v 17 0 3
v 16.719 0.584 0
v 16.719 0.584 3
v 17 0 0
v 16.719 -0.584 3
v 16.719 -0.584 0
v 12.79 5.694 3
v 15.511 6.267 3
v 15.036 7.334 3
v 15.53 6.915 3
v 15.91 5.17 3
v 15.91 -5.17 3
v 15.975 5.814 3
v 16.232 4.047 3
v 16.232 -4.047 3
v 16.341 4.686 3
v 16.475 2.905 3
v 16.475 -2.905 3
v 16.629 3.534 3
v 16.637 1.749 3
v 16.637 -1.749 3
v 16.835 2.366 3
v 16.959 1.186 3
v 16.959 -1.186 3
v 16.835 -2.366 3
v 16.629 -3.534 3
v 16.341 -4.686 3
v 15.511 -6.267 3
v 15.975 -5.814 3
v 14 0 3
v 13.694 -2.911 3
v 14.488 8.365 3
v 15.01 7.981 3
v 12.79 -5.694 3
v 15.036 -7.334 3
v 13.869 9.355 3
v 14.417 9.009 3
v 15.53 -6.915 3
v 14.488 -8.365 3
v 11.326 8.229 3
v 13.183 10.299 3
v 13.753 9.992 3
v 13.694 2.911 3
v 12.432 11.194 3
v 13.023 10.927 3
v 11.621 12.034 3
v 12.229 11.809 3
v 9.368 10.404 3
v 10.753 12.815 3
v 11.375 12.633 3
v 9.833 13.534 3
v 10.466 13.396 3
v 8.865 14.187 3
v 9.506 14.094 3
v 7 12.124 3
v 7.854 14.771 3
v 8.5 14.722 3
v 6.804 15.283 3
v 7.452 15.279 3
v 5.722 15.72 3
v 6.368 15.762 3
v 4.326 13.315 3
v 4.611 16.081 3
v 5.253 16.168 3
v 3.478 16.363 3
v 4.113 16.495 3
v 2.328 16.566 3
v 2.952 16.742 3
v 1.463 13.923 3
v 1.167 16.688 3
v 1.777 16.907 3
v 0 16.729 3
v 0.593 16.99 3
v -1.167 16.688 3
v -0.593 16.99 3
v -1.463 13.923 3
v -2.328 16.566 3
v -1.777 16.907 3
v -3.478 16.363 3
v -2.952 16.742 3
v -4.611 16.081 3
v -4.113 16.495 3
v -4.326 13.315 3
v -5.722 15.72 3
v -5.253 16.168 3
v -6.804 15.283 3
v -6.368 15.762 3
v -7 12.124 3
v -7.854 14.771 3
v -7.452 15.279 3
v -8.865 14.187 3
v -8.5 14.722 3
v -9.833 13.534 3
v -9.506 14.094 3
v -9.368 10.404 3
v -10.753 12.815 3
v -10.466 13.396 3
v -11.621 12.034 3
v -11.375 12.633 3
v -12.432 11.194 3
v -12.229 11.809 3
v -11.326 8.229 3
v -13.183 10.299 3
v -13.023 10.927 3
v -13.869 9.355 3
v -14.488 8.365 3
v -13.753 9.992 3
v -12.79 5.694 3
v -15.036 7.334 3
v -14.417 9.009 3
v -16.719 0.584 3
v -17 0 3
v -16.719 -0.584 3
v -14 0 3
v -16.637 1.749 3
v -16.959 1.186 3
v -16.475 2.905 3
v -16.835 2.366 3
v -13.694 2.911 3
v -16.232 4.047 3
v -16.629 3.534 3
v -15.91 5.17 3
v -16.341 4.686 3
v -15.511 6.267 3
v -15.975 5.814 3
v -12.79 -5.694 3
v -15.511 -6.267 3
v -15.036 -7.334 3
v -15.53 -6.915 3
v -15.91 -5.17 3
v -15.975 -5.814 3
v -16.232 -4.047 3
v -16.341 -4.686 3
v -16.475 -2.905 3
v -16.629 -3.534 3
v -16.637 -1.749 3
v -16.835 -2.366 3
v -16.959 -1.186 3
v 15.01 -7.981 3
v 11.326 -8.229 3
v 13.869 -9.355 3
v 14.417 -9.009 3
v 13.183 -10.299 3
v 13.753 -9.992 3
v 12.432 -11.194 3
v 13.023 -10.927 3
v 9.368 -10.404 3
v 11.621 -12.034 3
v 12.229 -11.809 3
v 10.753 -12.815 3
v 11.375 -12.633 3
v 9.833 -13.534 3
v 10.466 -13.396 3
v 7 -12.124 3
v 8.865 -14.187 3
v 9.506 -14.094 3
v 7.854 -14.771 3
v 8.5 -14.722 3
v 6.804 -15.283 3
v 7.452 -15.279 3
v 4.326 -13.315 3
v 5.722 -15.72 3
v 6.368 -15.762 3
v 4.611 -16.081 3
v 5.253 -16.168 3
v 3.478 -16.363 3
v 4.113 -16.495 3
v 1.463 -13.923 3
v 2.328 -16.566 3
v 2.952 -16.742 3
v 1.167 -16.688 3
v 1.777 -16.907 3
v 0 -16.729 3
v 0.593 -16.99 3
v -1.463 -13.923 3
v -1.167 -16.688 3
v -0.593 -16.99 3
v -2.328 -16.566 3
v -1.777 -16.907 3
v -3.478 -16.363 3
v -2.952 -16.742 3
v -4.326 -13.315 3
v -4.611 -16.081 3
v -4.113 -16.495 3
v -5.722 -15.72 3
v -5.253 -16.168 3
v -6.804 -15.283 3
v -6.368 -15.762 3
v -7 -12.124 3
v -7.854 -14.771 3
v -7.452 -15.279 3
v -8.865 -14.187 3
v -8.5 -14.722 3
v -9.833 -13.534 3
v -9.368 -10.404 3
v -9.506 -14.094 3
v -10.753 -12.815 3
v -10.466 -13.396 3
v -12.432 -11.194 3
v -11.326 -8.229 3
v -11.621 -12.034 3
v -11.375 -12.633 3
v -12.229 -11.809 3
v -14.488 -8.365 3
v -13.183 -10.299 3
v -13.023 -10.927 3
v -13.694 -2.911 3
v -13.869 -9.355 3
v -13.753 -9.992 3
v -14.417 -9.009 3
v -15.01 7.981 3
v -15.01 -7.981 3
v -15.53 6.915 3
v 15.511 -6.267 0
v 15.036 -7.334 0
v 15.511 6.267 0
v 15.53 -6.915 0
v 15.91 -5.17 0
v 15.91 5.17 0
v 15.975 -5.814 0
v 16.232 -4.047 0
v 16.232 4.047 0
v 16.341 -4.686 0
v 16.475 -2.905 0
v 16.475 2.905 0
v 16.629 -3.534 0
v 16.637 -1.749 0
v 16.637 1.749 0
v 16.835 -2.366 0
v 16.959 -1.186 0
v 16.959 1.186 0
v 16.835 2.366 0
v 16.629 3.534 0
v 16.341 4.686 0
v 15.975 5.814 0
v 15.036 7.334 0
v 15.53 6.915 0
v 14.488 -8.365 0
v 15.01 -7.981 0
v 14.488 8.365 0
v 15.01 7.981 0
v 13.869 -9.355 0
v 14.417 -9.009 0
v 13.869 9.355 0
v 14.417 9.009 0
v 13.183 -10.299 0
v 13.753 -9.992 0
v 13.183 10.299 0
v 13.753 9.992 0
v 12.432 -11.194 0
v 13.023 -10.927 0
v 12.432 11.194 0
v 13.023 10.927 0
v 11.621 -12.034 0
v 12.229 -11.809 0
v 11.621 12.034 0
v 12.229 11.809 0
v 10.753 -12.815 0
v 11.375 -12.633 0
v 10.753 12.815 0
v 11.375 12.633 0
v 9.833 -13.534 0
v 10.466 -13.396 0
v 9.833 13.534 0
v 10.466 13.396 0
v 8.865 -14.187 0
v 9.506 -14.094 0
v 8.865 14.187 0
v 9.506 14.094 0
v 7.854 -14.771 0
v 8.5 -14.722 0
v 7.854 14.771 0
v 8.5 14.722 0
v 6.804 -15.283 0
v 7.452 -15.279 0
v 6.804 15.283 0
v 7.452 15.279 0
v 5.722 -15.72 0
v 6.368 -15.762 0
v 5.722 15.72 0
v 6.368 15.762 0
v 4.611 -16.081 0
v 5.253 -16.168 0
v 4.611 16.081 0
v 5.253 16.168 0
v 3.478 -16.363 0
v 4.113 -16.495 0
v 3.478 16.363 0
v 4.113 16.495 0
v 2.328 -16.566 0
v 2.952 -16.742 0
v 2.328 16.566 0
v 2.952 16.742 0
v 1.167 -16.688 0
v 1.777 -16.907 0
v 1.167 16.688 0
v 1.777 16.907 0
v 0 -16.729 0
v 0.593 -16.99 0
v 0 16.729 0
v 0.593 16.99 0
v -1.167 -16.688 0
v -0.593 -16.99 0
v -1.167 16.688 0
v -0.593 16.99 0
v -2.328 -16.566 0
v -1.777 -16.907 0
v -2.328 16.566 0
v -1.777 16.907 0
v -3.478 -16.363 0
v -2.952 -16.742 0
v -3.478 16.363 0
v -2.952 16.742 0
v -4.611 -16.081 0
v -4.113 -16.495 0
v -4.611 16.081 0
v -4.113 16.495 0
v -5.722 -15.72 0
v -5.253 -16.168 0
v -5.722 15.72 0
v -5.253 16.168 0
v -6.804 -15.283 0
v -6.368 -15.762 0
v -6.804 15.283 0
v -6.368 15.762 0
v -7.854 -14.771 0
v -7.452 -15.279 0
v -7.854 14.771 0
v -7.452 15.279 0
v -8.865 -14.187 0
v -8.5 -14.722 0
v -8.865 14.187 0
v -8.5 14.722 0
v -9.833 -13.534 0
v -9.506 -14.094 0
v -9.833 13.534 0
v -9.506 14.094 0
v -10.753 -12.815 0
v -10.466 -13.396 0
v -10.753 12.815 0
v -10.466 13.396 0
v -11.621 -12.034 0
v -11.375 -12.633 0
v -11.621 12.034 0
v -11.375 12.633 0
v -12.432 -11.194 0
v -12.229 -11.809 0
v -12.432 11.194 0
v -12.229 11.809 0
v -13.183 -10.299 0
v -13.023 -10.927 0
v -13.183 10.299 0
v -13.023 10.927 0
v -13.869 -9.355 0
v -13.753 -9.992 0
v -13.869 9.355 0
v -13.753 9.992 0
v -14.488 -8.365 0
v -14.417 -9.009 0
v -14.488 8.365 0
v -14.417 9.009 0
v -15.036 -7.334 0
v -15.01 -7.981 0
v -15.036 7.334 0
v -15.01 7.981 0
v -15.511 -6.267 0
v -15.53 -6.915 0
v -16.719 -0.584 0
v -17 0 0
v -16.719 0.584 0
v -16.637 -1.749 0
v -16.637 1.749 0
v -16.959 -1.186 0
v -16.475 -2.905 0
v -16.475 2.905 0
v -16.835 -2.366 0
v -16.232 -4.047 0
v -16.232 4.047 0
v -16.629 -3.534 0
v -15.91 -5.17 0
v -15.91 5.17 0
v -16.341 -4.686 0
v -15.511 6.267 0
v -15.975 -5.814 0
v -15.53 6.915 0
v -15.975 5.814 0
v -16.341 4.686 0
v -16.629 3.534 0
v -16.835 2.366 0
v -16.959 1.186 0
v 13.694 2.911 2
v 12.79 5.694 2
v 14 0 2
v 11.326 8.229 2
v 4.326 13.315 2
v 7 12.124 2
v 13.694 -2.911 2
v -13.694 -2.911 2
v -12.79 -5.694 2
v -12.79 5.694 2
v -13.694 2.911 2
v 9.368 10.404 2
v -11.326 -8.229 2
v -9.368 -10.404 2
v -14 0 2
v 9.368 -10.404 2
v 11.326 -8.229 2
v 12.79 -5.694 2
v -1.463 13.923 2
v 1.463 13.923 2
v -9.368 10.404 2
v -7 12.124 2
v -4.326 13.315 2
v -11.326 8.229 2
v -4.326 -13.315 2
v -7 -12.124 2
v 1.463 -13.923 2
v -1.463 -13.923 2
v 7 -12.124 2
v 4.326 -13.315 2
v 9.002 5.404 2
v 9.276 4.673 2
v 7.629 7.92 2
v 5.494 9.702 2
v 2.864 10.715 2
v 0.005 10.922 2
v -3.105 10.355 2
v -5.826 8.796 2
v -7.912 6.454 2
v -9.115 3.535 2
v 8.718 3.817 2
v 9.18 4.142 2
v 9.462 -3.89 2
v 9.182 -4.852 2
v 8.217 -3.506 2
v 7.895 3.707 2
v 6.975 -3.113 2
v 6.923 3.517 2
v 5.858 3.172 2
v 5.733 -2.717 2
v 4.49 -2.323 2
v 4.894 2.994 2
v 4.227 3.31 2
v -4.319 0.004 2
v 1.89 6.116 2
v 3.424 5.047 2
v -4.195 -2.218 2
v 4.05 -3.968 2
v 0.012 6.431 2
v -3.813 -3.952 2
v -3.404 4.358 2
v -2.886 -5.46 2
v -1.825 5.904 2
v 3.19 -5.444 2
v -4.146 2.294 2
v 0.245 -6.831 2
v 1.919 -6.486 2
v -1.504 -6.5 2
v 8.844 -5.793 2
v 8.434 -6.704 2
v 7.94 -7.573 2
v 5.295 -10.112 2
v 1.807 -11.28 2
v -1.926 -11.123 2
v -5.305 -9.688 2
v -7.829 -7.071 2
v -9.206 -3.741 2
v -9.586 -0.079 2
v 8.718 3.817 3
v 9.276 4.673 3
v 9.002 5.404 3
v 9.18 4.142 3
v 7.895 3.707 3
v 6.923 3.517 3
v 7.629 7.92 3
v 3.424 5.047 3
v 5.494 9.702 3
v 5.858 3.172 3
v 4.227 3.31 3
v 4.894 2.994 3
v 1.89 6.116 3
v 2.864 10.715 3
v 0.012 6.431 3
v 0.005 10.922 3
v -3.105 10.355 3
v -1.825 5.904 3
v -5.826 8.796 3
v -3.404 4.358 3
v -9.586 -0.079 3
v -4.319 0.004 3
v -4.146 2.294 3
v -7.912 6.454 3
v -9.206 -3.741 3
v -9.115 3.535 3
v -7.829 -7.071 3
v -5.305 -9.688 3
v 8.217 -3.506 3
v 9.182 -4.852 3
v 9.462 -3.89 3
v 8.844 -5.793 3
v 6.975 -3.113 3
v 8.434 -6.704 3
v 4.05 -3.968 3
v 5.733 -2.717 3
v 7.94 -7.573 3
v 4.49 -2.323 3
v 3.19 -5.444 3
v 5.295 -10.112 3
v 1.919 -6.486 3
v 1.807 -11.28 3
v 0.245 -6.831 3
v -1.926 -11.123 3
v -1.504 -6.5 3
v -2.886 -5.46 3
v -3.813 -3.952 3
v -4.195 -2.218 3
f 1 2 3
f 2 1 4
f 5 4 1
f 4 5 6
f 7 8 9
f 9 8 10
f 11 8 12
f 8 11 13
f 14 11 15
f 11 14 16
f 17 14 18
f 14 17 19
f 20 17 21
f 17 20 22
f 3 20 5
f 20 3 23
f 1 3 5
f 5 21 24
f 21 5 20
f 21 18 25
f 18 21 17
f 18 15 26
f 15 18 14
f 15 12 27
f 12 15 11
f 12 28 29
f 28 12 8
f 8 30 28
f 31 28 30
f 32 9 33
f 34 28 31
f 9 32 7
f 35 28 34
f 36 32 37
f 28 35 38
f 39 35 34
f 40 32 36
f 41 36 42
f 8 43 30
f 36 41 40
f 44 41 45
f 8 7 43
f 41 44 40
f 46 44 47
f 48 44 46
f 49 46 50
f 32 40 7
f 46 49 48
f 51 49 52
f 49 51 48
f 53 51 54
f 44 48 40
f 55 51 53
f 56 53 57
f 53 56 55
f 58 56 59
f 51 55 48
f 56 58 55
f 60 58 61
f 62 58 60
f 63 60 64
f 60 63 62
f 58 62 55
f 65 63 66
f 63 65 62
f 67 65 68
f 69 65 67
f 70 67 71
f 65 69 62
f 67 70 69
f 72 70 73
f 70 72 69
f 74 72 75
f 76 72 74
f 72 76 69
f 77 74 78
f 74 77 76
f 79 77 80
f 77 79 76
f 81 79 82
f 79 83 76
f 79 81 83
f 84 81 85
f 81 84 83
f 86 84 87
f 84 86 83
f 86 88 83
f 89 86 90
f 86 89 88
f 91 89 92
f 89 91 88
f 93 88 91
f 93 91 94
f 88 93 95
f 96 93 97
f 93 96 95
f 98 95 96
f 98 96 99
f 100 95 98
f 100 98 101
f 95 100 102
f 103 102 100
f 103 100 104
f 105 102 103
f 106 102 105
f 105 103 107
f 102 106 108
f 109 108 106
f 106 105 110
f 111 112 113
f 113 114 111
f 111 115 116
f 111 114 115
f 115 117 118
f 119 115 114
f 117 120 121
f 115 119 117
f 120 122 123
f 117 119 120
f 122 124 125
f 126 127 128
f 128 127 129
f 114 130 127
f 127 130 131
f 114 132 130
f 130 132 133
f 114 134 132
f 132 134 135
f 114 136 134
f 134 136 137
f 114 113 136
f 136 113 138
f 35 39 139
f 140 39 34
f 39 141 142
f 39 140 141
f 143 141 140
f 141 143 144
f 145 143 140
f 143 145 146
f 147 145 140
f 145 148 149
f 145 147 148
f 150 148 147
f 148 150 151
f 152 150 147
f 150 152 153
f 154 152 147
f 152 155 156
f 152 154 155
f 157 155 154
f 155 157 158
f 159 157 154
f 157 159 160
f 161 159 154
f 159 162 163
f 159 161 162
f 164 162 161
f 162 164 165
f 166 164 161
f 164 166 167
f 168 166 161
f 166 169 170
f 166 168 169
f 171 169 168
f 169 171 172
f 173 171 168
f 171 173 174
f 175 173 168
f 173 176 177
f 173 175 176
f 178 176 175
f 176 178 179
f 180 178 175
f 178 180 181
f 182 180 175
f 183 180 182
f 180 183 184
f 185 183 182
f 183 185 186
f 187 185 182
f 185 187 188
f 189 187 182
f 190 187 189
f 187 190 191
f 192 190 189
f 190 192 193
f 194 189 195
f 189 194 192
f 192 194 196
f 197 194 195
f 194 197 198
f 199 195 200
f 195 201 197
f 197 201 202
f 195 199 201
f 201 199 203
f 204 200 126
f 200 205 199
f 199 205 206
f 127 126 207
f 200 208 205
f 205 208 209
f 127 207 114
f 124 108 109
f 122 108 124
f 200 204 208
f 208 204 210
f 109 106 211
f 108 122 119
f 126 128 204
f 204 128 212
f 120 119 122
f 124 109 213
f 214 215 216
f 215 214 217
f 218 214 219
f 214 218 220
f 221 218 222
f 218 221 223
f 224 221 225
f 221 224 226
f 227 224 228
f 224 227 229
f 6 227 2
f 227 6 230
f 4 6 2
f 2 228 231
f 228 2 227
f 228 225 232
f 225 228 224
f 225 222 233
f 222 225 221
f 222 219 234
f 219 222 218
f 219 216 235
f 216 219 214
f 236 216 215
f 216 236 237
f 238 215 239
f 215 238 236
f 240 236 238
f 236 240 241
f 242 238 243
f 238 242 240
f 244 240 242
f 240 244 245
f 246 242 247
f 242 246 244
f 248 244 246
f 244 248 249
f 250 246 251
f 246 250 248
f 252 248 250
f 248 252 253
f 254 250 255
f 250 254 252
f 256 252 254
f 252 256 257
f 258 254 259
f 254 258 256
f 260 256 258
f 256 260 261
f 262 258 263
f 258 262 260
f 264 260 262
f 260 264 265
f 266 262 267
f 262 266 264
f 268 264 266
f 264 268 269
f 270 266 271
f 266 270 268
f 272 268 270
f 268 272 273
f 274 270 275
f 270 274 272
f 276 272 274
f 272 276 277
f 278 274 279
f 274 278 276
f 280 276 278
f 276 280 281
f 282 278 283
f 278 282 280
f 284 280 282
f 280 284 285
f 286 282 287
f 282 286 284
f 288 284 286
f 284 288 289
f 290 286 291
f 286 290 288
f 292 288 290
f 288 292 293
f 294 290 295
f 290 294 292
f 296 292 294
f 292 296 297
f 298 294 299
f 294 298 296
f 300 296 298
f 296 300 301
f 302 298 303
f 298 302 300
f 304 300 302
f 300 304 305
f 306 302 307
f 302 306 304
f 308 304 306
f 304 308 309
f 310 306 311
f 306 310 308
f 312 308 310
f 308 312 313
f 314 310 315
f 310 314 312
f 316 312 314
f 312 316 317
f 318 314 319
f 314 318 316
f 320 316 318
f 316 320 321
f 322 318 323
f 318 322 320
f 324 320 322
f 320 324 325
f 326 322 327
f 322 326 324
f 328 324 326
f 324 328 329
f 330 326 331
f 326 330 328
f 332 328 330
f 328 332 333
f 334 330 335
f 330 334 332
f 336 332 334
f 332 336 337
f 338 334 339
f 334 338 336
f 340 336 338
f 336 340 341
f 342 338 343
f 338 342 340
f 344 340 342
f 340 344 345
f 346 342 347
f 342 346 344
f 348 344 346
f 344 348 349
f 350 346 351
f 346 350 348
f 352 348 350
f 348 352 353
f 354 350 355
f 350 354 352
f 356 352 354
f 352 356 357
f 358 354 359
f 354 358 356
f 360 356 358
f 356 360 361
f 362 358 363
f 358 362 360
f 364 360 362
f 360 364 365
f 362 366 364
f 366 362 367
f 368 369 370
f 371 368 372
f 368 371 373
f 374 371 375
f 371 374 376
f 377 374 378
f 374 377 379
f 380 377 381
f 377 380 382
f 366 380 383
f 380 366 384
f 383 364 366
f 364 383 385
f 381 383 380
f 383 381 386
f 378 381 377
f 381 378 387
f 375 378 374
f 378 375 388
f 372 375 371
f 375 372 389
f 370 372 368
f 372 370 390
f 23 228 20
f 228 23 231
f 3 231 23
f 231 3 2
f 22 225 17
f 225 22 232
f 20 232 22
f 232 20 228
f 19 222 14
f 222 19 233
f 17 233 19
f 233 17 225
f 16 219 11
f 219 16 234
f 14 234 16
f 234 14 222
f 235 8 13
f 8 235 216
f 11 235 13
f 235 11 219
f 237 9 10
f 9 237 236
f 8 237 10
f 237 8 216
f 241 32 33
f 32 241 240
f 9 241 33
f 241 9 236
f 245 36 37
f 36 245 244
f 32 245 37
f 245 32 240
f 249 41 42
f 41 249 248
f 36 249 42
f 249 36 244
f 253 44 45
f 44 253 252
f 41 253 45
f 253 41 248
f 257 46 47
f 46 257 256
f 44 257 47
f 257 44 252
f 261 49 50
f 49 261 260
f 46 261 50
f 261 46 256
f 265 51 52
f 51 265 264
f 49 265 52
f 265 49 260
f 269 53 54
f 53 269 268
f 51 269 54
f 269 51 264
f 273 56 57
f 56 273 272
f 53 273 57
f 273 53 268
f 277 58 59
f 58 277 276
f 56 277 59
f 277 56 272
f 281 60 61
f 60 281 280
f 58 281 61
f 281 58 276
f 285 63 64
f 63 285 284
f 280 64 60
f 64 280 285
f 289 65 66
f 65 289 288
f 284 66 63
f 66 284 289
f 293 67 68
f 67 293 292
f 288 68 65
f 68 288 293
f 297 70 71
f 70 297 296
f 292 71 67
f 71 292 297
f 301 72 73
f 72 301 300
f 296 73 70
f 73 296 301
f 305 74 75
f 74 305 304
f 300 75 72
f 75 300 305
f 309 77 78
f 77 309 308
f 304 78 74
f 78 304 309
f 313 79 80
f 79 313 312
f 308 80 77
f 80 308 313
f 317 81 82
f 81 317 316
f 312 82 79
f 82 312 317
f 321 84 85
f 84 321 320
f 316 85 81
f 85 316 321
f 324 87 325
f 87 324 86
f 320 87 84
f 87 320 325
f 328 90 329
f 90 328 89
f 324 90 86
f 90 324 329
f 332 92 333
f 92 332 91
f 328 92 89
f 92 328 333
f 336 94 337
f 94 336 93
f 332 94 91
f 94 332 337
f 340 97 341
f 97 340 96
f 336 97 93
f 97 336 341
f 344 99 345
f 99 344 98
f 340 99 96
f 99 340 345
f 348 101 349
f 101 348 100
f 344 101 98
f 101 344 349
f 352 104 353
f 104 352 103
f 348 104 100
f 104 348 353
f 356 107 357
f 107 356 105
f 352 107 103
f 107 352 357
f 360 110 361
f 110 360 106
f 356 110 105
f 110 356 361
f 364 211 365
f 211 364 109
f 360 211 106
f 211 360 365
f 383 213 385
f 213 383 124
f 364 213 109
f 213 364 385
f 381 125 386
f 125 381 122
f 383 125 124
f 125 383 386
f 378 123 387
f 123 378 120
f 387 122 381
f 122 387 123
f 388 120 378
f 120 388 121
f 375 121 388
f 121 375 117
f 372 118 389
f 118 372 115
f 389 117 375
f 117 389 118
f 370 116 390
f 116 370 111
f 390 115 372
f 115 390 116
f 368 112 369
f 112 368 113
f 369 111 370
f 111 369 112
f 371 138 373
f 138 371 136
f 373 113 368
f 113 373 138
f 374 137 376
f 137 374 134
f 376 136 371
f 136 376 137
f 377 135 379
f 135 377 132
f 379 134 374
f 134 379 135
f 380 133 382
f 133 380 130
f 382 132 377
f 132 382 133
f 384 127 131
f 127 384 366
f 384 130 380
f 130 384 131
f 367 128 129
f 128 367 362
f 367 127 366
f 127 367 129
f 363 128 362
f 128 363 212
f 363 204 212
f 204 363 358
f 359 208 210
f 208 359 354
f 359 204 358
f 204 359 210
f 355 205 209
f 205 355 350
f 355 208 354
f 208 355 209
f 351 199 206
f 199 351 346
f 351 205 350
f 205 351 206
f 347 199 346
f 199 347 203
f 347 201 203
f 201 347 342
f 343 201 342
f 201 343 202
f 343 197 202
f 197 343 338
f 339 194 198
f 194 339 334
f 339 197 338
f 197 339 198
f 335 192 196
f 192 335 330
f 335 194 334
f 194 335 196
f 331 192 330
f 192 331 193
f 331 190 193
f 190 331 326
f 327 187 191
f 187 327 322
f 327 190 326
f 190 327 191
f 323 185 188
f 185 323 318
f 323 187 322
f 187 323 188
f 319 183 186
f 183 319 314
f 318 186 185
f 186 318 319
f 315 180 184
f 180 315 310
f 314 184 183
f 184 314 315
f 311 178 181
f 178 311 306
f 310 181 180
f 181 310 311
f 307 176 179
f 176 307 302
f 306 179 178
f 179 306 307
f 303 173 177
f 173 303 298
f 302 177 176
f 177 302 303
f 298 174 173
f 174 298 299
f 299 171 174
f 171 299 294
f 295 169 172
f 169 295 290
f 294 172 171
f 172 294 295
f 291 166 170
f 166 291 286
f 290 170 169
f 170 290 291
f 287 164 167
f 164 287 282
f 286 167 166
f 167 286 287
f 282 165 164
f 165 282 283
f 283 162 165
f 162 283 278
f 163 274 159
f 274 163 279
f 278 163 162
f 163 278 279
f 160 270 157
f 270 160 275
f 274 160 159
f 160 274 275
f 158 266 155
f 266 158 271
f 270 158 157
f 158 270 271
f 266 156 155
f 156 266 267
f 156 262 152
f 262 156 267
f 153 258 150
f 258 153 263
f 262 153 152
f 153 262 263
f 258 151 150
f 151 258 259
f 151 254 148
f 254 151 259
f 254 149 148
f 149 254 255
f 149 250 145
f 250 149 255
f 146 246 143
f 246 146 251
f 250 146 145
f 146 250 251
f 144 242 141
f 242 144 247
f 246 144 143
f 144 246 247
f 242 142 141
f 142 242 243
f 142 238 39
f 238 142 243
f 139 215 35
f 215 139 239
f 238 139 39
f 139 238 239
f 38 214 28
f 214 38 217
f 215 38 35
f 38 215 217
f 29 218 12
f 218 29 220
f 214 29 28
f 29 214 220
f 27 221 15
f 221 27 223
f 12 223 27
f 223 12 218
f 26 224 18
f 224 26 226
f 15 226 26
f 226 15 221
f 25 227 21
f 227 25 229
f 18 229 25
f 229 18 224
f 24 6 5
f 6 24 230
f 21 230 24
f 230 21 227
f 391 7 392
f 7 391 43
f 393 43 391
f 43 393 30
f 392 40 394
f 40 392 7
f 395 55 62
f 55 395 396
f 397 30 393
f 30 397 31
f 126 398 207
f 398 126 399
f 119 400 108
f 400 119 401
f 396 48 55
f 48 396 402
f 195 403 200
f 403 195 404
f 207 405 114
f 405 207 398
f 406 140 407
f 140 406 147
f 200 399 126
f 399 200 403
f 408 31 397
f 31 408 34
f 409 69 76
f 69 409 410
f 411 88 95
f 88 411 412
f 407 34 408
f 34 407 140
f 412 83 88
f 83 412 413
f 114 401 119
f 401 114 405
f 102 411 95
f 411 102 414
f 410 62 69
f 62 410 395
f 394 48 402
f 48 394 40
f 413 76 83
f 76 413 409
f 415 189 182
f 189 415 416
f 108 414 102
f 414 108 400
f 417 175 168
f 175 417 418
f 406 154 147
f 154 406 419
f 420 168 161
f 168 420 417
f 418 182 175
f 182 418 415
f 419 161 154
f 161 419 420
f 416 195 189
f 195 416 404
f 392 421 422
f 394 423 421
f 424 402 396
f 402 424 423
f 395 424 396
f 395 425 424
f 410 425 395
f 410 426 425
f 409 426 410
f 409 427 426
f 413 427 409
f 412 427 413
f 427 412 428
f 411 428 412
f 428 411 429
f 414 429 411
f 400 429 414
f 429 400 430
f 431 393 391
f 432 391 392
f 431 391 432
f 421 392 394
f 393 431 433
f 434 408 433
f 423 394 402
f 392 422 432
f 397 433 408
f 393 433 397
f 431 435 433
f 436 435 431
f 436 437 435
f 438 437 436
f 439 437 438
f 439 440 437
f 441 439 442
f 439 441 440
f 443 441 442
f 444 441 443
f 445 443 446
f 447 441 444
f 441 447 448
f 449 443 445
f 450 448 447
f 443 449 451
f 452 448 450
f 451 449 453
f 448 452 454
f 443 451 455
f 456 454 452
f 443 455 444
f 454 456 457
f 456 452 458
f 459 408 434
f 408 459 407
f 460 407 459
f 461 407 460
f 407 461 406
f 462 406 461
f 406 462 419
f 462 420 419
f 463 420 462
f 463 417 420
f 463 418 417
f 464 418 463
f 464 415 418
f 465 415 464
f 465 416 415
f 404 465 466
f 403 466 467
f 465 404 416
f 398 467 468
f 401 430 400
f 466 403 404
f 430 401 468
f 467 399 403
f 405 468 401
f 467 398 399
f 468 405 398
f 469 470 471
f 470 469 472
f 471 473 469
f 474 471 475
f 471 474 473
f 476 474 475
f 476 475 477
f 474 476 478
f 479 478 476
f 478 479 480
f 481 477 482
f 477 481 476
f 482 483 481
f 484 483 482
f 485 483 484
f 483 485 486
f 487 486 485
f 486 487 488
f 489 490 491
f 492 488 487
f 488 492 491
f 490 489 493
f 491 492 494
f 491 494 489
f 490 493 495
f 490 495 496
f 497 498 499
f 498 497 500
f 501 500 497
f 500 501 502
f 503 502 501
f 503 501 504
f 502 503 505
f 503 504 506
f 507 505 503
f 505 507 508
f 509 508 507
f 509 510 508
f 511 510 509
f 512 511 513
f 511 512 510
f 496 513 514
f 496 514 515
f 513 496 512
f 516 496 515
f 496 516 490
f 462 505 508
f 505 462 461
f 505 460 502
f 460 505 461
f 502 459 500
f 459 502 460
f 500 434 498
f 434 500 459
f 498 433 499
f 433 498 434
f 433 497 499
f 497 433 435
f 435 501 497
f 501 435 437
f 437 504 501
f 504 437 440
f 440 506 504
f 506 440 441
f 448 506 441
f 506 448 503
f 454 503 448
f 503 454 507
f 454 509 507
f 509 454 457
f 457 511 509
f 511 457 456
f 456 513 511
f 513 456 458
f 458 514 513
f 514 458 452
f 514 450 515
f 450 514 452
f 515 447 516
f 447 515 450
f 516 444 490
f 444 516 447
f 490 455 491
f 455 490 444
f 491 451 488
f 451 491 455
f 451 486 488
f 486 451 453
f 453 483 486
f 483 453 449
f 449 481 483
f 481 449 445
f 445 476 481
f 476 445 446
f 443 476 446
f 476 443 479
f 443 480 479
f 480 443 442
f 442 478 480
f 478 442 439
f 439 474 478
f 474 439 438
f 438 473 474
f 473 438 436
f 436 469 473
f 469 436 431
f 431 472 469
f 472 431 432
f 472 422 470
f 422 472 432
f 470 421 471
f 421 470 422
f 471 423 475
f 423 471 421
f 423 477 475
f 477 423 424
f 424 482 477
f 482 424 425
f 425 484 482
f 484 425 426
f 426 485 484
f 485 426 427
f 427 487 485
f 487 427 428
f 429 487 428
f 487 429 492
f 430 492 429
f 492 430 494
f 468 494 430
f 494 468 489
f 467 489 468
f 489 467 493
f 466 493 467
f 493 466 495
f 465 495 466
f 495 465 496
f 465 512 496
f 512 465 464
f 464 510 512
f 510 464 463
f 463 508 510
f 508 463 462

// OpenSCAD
module coin() {
  for(n=[0:90]) {
    rotate([0,0,n*4]) translate([15,0,0]) cylinder(r = 2, h = 3);
  }
  cylinder(r = 14, h = 3);
}

difference() {
  coin();
  translate([0,0,2]) cylinder(r = 14, h = 2);
}

translate([-13,-13,2]) scale([0.3,0.3,1]) linear_extrude(file = "c.dxf", height = 2, center = true);
